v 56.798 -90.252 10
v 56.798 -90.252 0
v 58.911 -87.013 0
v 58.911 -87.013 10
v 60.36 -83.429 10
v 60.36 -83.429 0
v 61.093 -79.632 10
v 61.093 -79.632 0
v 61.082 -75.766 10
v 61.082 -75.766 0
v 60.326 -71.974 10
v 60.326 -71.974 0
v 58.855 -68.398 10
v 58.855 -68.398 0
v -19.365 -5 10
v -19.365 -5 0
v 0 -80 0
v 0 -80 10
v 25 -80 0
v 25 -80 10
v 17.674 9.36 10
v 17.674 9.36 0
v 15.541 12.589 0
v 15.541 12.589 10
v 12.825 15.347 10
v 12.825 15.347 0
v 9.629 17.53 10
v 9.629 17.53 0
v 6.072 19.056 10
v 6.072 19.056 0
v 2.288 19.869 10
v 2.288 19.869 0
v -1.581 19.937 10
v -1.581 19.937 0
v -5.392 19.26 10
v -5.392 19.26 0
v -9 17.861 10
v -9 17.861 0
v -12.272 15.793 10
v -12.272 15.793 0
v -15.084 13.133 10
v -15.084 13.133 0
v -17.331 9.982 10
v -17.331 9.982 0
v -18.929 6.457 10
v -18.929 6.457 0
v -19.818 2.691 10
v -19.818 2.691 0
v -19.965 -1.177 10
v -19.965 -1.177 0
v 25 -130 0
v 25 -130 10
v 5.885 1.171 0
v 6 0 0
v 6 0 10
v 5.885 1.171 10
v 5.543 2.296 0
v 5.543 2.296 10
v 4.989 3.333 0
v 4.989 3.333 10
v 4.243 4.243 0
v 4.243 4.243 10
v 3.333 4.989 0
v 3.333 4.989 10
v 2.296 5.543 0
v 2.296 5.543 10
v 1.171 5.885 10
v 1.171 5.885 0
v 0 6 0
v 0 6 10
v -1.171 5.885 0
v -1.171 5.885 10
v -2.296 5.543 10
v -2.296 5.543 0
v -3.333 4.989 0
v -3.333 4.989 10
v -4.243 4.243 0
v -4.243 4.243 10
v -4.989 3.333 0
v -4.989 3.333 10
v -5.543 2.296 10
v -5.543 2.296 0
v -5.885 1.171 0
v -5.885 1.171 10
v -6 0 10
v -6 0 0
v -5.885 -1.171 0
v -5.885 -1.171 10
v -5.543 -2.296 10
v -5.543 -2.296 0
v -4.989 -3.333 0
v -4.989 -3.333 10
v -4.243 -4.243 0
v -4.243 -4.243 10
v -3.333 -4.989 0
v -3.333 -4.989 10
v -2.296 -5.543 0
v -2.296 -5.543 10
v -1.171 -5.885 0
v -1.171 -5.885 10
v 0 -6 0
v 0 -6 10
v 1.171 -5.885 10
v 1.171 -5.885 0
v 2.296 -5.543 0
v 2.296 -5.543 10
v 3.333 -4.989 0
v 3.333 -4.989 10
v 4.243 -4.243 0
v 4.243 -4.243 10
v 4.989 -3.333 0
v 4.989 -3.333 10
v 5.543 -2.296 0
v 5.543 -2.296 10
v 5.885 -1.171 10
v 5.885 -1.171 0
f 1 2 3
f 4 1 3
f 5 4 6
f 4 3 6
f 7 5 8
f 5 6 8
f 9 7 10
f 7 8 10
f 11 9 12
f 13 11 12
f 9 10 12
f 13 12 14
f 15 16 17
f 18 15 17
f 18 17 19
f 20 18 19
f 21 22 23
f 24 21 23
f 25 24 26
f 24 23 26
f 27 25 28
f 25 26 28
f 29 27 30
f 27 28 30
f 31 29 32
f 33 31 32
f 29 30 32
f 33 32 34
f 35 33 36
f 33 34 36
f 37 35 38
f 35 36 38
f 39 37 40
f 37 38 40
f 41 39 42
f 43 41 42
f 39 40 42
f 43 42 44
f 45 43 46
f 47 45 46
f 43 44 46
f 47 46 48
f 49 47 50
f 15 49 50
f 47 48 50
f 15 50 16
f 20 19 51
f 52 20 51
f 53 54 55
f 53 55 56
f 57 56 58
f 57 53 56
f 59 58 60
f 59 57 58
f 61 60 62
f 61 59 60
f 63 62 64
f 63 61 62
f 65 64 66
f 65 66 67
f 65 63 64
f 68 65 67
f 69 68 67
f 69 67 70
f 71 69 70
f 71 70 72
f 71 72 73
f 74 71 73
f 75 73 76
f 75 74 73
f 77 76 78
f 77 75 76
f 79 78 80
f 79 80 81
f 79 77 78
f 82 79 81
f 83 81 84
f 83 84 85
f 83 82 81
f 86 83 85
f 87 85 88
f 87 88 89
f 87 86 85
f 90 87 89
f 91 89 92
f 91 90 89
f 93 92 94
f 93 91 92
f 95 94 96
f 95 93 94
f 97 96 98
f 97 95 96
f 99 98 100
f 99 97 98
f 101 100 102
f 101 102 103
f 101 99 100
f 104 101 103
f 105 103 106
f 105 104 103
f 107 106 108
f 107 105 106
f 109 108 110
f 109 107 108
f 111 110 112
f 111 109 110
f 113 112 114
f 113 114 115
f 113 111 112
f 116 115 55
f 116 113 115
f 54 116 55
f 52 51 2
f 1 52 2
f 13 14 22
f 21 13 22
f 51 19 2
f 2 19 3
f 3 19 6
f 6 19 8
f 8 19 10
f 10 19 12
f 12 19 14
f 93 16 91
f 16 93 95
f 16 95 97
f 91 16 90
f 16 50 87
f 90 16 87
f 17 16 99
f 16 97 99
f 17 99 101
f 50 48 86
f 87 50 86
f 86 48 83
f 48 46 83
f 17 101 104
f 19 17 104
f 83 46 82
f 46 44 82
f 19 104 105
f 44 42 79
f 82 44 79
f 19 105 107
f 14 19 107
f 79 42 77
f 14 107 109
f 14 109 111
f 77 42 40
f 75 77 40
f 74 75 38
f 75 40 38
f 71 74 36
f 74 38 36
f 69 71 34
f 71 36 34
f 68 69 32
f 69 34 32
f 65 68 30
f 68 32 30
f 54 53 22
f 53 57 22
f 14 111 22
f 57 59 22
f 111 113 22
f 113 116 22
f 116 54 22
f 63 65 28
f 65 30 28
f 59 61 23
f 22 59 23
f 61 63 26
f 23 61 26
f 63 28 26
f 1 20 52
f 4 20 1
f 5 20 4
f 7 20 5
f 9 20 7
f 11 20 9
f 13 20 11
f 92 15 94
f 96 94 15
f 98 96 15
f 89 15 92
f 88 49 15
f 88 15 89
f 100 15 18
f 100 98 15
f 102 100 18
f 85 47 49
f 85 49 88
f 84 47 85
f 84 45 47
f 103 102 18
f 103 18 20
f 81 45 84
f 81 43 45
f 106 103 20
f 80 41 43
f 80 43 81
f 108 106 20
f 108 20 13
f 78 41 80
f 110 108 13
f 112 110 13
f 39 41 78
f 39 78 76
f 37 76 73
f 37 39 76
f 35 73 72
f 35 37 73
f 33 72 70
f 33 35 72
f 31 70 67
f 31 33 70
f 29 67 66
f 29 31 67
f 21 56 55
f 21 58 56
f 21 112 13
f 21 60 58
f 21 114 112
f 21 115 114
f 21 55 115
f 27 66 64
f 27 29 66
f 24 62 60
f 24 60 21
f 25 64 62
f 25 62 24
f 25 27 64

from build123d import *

# Parameters (mm, degrees)
F0_R     = 6
F1_DEPTH = 10


with BuildPart() as f1:
    # F0 (on Top) → F1 (new body)
    with BuildSketch(Plane.XY):
        with BuildLine():
            Line((58.85537, -68.397695), (17.674352, 9.360411))
            ThreePointArc((17.674352, 9.360411), (-7.229789, 18.647524), (-19.364917, -5))
            Line((-19.364917, -5), (0, -80))
            Line((0, -80), (25, -80))
            Line((25, -80), (25, -130))
            Line((25, -130), (56.798395, -90.252006))
            ThreePointArc((56.798395, -90.252006), (61.093013, -79.632266), (58.85537, -68.397695))
        make_face()
        Circle(F0_R, mode=Mode.SUBTRACT)
    extrude(amount=F1_DEPTH)


solid = f1.part
